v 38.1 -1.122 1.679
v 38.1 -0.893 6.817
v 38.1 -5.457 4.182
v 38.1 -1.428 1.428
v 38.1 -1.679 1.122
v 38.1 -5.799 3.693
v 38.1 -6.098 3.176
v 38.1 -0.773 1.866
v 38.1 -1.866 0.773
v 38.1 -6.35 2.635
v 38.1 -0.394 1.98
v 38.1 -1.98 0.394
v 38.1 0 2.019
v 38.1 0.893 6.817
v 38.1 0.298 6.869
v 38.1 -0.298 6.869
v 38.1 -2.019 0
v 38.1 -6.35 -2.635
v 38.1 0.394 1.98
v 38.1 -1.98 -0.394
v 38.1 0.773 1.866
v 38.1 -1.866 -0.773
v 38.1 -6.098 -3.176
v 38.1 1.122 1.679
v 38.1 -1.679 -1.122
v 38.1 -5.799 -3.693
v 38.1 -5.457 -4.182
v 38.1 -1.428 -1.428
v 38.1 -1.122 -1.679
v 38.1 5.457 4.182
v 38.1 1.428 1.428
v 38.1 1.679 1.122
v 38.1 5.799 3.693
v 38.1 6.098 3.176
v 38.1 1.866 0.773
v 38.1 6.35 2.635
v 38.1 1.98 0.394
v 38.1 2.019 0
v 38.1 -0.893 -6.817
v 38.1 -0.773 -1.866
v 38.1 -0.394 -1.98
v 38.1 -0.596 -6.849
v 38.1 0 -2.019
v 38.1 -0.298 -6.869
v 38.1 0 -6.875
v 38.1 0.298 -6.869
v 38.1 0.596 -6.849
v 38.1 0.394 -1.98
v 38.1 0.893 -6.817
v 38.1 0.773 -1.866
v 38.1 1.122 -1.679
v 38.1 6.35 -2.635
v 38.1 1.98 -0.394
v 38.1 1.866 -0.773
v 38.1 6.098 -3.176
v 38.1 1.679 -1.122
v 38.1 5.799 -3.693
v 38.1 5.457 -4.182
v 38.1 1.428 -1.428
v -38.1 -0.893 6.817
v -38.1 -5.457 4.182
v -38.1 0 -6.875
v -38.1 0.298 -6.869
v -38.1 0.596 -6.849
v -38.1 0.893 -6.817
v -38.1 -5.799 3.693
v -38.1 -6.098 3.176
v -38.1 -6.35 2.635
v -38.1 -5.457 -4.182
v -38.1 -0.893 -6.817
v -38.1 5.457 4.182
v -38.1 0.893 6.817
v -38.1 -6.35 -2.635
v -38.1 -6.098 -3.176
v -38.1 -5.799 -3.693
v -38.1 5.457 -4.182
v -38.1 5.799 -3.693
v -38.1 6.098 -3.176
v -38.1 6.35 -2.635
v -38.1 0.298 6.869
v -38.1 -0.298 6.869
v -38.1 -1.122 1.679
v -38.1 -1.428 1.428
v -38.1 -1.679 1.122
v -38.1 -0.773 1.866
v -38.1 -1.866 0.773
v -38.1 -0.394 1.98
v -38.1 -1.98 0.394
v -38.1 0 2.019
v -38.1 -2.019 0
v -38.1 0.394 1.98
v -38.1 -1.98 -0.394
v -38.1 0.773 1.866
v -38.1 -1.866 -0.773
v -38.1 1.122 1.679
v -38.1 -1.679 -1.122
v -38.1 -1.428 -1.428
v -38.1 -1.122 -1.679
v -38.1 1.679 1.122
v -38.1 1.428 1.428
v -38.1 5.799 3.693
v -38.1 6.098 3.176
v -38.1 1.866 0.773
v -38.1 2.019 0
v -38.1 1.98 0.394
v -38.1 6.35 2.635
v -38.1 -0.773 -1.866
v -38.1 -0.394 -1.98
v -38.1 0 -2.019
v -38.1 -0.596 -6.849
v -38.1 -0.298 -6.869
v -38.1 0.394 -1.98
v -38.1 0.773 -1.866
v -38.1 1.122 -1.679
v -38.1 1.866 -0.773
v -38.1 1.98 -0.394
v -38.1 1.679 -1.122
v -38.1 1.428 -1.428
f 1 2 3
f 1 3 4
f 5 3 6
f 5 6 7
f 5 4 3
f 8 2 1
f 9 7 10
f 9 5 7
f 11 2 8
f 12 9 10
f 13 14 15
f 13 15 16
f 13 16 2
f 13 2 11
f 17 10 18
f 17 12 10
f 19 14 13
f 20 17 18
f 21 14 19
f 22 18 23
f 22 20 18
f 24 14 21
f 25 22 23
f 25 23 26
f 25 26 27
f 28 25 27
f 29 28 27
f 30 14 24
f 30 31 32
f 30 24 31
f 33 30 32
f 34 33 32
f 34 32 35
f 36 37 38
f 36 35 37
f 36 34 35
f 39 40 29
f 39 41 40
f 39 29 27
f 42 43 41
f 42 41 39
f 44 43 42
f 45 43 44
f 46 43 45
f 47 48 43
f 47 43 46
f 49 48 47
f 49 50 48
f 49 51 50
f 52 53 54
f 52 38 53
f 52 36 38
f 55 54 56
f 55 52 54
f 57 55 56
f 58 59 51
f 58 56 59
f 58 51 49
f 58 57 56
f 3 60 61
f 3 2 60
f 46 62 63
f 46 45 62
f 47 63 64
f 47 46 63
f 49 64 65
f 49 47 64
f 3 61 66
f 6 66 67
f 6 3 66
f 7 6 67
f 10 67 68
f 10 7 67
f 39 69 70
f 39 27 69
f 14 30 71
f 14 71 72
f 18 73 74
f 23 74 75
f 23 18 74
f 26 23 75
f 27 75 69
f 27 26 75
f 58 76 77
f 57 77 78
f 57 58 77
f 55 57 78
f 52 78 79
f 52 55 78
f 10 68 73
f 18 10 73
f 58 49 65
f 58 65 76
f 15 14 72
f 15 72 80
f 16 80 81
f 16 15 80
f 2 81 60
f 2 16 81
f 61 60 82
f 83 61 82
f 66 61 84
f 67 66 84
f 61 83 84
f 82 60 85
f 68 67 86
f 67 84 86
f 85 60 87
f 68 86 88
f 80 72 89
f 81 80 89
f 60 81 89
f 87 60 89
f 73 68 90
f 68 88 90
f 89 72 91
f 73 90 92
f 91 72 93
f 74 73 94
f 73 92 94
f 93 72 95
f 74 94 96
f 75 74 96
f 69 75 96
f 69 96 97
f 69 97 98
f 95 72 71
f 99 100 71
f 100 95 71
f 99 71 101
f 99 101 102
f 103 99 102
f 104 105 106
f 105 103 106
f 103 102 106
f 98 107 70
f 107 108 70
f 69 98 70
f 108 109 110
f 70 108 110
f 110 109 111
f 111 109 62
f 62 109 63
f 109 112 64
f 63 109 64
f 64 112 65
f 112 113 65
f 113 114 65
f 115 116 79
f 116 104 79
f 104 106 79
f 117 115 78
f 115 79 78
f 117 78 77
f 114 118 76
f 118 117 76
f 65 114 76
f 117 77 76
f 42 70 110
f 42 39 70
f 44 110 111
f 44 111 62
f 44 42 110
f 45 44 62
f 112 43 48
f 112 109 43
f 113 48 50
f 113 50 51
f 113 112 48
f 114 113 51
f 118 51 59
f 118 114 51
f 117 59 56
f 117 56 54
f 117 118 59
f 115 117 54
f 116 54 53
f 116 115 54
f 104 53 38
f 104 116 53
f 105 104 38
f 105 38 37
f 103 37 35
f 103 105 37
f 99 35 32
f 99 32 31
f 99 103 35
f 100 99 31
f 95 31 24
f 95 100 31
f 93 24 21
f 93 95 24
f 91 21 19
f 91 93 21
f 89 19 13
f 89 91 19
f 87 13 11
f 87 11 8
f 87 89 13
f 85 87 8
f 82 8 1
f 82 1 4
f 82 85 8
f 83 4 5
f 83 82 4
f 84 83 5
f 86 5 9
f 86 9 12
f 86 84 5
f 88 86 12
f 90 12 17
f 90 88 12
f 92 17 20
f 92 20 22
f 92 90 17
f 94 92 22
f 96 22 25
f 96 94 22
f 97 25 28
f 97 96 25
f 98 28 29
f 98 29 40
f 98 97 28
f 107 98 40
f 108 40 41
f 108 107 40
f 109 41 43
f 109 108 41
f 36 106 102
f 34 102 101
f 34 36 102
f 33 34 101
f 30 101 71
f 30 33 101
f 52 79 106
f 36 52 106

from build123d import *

# Parameters (mm, degrees)
SKETCH1_R           = 2.0193
BOSS_EXTRUDE1_DEPTH = 38.1


with BuildPart() as part:
    # Sketch1 → Boss-Extrude1 (new, symmetric)
    with BuildSketch(Plane(origin=(0, 0, 0), x_dir=(0, 0, -1), z_dir=(1, 0, 0))):
        with BuildLine():
            ThreePointArc((6.874999966, 0), (6.860422465, 0.447468582), (6.816751782, 0.893039571))
            Line((6.816751782, 0.893039571), (4.181770846, 5.456960429))
            ThreePointArc((4.181770846, 5.456960429), (3.437499983, 5.953924622), (2.634980936, 6.35))
            Line((2.634980936, 6.35), (-2.634980936, 6.35))
            ThreePointArc((-2.634980936, 6.35), (-3.437499983, 5.953924622), (-4.181770846, 5.456960429))
            Line((-4.181770846, 5.456960429), (-6.816751782, 0.893039571))
            ThreePointArc((-6.816751782, 0.893039571), (-6.874999966, 0), (-6.816751782, -0.893039571))
            Line((-6.816751782, -0.893039571), (-4.181770846, -5.456960429))
            ThreePointArc((-4.181770846, -5.456960429), (-3.437499983, -5.953924622), (-2.634980936, -6.35))
            Line((-2.634980936, -6.35), (2.634980936, -6.35))
            ThreePointArc((2.634980936, -6.35), (3.437499983, -5.953924622), (4.181770846, -5.456960429))
            Line((4.181770846, -5.456960429), (6.816751782, -0.893039571))
            ThreePointArc((6.816751782, -0.893039571), (6.860422465, -0.447468582), (6.874999966, 0))
        make_face()
        Circle(SKETCH1_R, mode=Mode.SUBTRACT)
    extrude(amount=BOSS_EXTRUDE1_DEPTH, both=True)


solid = part.part
